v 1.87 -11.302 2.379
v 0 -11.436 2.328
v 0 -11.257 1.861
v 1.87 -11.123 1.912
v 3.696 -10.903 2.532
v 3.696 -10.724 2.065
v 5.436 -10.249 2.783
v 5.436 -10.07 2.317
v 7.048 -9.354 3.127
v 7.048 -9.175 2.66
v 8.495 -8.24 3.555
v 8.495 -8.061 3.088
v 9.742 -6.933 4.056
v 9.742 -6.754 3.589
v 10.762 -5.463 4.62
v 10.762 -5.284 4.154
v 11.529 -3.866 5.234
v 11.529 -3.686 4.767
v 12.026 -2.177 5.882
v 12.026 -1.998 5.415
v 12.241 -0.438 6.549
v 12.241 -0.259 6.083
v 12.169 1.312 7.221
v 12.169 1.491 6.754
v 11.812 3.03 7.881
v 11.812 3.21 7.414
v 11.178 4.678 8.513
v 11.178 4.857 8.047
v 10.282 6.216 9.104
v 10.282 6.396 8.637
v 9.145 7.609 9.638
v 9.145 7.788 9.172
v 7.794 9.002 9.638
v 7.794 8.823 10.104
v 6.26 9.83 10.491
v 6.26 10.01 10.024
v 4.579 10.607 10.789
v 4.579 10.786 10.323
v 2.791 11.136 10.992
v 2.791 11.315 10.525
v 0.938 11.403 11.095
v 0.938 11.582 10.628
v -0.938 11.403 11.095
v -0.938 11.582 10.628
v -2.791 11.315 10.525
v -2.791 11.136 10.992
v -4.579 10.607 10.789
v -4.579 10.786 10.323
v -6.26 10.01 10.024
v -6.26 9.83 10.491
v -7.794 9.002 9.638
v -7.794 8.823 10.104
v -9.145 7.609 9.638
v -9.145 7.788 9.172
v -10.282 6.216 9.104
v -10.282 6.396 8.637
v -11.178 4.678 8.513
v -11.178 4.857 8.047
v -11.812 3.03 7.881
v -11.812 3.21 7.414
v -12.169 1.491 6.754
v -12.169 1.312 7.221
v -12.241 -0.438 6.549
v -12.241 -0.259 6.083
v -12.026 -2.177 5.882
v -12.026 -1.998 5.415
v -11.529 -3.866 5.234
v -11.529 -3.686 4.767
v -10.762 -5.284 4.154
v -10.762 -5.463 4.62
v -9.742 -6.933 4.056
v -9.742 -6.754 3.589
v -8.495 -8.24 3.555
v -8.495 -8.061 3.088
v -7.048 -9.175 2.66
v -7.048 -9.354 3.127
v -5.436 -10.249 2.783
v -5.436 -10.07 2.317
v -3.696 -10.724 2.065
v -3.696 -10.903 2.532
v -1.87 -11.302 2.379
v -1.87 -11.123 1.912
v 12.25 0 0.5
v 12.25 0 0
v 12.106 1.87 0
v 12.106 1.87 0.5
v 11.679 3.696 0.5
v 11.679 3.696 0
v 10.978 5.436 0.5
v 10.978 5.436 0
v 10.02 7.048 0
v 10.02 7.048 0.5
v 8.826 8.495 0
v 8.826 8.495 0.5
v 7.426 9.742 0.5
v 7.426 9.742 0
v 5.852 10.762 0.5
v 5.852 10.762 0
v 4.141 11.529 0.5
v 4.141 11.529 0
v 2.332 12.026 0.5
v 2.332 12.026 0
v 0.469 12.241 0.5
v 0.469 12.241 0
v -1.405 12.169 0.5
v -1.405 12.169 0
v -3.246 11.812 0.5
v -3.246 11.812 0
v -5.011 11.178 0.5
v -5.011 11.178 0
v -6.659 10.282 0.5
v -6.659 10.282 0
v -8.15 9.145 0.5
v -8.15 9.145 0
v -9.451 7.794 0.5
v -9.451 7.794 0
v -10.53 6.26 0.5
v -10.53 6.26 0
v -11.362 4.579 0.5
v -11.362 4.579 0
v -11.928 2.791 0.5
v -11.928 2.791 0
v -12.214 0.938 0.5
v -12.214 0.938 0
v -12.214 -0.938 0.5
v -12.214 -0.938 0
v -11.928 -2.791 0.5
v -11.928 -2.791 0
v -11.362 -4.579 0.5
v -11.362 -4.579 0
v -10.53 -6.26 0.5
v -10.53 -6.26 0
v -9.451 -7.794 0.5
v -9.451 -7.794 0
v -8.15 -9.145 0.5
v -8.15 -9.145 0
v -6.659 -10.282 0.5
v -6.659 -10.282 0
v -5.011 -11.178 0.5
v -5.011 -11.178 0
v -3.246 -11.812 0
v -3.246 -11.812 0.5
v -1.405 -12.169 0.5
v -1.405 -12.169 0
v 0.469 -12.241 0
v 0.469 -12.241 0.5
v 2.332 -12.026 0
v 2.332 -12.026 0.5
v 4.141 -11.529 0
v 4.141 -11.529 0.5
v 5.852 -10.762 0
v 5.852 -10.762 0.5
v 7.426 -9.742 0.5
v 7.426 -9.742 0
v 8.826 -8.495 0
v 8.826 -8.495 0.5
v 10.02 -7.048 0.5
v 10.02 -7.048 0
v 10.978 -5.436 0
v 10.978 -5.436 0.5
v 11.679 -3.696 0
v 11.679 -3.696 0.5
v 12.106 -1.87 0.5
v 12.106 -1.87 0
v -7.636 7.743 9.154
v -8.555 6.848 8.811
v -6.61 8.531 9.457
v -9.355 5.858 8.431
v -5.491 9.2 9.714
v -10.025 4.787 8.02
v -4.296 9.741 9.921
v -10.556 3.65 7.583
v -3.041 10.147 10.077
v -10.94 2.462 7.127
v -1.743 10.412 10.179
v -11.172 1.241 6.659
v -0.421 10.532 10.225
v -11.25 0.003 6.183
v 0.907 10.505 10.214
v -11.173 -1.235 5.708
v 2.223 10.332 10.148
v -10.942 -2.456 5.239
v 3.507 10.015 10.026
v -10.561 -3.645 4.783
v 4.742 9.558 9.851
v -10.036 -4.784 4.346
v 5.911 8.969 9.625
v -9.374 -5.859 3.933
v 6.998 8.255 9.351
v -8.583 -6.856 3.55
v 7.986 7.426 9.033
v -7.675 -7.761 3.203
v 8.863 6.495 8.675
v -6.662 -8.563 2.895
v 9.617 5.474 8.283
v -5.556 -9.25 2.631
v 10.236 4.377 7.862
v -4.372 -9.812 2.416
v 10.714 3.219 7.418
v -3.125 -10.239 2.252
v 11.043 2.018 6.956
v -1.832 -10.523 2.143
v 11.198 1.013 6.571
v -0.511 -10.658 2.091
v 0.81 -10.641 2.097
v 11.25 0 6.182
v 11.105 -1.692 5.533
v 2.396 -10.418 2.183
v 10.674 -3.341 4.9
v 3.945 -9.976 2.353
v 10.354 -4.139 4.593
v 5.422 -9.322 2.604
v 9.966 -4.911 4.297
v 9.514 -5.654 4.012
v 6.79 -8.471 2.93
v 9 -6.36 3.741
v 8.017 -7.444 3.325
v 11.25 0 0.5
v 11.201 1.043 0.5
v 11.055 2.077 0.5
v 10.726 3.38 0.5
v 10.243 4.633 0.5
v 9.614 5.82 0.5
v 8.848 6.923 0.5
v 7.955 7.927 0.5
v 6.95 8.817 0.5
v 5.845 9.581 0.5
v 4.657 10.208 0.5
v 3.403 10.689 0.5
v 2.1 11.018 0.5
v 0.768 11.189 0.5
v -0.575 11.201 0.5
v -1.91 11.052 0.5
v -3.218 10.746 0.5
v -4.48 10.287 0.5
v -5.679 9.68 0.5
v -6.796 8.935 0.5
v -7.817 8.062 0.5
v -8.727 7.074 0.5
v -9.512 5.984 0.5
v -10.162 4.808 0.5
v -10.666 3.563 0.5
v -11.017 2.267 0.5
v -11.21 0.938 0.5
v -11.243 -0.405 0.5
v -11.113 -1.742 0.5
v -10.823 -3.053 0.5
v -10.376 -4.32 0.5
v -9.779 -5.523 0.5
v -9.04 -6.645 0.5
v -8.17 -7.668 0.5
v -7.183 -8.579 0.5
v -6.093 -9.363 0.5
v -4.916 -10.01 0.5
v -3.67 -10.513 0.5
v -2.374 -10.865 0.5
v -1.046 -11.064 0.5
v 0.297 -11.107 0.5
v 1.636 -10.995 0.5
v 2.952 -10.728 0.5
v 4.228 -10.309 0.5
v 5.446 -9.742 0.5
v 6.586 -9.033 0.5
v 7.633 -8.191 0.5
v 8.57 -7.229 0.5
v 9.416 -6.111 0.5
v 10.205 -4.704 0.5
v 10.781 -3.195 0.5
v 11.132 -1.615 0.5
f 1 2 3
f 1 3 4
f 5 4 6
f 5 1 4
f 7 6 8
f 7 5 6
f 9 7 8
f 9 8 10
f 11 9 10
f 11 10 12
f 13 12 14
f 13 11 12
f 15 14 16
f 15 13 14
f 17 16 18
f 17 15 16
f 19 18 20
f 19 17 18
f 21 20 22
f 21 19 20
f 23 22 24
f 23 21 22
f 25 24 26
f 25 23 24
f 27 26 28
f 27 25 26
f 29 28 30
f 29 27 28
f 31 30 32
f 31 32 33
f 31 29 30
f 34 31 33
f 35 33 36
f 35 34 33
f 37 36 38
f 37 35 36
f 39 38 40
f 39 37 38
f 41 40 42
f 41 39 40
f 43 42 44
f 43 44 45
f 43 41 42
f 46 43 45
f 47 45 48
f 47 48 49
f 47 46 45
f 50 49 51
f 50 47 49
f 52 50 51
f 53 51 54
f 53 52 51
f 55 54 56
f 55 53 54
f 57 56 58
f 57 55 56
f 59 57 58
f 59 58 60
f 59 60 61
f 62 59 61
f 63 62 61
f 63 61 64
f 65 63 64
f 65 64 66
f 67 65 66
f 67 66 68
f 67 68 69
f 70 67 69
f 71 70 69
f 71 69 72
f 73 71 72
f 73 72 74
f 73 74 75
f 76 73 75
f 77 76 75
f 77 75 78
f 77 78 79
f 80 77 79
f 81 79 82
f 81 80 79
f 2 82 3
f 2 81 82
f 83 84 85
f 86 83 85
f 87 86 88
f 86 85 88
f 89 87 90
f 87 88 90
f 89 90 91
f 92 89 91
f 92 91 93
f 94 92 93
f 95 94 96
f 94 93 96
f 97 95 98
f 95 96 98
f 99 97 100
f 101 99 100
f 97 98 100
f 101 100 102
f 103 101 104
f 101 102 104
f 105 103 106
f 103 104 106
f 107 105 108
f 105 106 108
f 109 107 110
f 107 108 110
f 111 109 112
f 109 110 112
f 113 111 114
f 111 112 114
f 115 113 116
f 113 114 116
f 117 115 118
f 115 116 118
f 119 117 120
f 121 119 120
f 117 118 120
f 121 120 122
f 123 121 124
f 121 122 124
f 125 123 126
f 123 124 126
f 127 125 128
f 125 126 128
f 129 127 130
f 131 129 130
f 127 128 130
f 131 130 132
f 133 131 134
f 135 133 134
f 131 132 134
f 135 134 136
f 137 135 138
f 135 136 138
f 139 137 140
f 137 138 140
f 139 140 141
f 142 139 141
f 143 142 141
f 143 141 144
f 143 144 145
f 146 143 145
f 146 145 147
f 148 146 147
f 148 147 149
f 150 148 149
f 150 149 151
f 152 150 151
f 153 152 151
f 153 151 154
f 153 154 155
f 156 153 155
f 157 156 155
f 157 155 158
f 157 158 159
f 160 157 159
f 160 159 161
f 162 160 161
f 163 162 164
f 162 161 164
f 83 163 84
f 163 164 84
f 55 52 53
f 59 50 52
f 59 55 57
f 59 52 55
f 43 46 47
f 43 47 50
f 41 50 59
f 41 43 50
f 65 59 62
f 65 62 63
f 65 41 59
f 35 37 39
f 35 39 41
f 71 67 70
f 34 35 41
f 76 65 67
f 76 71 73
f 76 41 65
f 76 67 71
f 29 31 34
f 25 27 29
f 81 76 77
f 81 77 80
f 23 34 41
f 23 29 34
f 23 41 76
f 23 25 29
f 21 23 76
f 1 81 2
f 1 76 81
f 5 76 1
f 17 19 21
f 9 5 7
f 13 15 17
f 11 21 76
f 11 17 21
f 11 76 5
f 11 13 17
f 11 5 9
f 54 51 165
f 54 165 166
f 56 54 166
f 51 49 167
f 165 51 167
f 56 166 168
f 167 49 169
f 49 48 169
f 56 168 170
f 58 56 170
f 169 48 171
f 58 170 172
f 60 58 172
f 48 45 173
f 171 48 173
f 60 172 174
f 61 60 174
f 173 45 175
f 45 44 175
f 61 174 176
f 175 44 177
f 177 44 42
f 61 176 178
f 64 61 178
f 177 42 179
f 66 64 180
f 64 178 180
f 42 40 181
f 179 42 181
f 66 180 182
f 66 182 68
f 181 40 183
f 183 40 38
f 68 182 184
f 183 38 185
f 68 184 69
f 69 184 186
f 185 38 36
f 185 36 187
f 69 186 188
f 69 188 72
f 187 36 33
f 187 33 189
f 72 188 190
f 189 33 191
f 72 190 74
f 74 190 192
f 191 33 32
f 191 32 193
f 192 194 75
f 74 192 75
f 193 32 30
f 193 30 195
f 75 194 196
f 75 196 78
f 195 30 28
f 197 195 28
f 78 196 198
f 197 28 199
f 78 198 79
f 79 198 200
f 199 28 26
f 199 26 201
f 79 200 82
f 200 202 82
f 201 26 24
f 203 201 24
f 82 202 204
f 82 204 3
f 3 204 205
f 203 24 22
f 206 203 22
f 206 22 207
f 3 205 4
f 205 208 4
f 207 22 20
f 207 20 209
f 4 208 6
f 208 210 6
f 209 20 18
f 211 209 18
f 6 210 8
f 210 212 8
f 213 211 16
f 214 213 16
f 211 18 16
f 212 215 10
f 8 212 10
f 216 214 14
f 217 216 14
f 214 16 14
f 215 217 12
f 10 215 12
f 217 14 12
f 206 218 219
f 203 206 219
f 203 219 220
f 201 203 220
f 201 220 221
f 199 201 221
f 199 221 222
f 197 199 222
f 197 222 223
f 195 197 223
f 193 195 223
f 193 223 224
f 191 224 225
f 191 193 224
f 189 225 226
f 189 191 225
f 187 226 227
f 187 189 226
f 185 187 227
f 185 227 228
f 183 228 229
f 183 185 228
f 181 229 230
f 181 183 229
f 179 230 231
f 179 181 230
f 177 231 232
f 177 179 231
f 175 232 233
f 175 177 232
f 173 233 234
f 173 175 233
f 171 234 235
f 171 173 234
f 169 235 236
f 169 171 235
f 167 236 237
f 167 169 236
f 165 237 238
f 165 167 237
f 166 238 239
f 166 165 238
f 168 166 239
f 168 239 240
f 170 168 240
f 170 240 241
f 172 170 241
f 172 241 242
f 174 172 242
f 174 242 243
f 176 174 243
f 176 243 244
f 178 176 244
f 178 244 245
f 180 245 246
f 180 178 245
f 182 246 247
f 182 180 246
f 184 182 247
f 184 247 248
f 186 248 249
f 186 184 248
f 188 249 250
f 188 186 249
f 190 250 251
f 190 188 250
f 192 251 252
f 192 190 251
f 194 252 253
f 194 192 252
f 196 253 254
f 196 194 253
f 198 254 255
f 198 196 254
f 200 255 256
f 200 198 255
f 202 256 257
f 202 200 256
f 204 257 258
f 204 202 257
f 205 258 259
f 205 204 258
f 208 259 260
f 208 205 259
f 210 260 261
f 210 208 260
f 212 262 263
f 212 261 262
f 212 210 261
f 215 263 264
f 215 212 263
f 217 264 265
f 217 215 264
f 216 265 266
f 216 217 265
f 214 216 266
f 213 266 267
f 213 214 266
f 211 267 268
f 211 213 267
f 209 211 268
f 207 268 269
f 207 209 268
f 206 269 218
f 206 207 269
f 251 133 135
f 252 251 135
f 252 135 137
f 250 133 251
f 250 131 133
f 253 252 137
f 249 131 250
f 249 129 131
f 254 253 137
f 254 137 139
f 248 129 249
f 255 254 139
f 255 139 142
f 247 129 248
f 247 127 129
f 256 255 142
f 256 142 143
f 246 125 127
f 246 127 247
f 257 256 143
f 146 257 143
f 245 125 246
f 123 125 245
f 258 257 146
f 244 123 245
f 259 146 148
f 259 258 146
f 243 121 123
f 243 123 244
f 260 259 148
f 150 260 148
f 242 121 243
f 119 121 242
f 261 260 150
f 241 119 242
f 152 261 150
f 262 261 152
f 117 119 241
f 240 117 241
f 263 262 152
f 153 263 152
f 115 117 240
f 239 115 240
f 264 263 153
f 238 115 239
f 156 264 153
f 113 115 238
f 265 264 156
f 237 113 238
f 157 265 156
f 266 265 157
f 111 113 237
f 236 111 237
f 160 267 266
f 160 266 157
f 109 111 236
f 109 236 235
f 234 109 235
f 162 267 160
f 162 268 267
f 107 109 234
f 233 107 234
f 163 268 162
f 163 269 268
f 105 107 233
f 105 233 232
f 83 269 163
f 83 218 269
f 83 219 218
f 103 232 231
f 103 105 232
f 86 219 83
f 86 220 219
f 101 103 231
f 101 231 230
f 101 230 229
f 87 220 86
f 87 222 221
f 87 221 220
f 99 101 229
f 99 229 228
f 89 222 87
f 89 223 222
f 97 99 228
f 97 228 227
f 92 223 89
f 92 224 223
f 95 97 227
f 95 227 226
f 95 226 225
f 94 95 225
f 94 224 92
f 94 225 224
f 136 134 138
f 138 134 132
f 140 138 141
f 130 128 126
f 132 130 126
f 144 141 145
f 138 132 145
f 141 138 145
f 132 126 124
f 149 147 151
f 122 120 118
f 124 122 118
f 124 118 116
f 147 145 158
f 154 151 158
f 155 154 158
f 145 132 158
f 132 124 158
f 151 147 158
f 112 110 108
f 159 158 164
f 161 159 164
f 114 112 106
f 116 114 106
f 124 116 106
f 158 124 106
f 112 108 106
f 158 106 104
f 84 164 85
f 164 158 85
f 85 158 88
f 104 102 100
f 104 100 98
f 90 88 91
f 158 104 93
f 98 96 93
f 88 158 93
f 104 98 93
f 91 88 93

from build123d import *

# Parameters (mm, degrees)
SKETCH1_R           = 11.25
SKETCH3_R           = 11.25
SKETCH3_5_R         = 12.25
BOSS_EXTRUDE1_DEPTH = 0.5
SKETCH1_4_R         = 12.25
BOSS_EXTRUDE2_DEPTH = 0.5


with BuildPart() as part:
    # Sketch1 → Loft1 section 0
    with BuildSketch(Plane.XY):
        Circle(SKETCH1_R)
    # Sketch3 → Loft1 section 1
    with BuildSketch(Plane(origin=(0, -2.247482777, 5.854892806), x_dir=(1, 0, 0), z_dir=(0, -0.358367949545301, 0.9335804264972015))):
        with Locations((0, 2.407379925)):
            Circle(SKETCH3_R)
    loft()

    # Sketch3<5> → Boss-Extrude1 (add)
    with BuildSketch(Plane(origin=(0, -2.247482777, 5.854892806), x_dir=(1, 0, 0), z_dir=(0, -0.358367949545301, 0.9335804264972015))):
        with Locations(Location((0, 2.407379925, 0), (0, 0, 270))):
            Circle(SKETCH3_5_R)
    extrude(amount=-BOSS_EXTRUDE1_DEPTH)

    # Sketch1<4> → Boss-Extrude2 (add)
    with BuildSketch(Plane.XY):
        Circle(SKETCH1_4_R)
    extrude(amount=BOSS_EXTRUDE2_DEPTH)


solid = part.part
